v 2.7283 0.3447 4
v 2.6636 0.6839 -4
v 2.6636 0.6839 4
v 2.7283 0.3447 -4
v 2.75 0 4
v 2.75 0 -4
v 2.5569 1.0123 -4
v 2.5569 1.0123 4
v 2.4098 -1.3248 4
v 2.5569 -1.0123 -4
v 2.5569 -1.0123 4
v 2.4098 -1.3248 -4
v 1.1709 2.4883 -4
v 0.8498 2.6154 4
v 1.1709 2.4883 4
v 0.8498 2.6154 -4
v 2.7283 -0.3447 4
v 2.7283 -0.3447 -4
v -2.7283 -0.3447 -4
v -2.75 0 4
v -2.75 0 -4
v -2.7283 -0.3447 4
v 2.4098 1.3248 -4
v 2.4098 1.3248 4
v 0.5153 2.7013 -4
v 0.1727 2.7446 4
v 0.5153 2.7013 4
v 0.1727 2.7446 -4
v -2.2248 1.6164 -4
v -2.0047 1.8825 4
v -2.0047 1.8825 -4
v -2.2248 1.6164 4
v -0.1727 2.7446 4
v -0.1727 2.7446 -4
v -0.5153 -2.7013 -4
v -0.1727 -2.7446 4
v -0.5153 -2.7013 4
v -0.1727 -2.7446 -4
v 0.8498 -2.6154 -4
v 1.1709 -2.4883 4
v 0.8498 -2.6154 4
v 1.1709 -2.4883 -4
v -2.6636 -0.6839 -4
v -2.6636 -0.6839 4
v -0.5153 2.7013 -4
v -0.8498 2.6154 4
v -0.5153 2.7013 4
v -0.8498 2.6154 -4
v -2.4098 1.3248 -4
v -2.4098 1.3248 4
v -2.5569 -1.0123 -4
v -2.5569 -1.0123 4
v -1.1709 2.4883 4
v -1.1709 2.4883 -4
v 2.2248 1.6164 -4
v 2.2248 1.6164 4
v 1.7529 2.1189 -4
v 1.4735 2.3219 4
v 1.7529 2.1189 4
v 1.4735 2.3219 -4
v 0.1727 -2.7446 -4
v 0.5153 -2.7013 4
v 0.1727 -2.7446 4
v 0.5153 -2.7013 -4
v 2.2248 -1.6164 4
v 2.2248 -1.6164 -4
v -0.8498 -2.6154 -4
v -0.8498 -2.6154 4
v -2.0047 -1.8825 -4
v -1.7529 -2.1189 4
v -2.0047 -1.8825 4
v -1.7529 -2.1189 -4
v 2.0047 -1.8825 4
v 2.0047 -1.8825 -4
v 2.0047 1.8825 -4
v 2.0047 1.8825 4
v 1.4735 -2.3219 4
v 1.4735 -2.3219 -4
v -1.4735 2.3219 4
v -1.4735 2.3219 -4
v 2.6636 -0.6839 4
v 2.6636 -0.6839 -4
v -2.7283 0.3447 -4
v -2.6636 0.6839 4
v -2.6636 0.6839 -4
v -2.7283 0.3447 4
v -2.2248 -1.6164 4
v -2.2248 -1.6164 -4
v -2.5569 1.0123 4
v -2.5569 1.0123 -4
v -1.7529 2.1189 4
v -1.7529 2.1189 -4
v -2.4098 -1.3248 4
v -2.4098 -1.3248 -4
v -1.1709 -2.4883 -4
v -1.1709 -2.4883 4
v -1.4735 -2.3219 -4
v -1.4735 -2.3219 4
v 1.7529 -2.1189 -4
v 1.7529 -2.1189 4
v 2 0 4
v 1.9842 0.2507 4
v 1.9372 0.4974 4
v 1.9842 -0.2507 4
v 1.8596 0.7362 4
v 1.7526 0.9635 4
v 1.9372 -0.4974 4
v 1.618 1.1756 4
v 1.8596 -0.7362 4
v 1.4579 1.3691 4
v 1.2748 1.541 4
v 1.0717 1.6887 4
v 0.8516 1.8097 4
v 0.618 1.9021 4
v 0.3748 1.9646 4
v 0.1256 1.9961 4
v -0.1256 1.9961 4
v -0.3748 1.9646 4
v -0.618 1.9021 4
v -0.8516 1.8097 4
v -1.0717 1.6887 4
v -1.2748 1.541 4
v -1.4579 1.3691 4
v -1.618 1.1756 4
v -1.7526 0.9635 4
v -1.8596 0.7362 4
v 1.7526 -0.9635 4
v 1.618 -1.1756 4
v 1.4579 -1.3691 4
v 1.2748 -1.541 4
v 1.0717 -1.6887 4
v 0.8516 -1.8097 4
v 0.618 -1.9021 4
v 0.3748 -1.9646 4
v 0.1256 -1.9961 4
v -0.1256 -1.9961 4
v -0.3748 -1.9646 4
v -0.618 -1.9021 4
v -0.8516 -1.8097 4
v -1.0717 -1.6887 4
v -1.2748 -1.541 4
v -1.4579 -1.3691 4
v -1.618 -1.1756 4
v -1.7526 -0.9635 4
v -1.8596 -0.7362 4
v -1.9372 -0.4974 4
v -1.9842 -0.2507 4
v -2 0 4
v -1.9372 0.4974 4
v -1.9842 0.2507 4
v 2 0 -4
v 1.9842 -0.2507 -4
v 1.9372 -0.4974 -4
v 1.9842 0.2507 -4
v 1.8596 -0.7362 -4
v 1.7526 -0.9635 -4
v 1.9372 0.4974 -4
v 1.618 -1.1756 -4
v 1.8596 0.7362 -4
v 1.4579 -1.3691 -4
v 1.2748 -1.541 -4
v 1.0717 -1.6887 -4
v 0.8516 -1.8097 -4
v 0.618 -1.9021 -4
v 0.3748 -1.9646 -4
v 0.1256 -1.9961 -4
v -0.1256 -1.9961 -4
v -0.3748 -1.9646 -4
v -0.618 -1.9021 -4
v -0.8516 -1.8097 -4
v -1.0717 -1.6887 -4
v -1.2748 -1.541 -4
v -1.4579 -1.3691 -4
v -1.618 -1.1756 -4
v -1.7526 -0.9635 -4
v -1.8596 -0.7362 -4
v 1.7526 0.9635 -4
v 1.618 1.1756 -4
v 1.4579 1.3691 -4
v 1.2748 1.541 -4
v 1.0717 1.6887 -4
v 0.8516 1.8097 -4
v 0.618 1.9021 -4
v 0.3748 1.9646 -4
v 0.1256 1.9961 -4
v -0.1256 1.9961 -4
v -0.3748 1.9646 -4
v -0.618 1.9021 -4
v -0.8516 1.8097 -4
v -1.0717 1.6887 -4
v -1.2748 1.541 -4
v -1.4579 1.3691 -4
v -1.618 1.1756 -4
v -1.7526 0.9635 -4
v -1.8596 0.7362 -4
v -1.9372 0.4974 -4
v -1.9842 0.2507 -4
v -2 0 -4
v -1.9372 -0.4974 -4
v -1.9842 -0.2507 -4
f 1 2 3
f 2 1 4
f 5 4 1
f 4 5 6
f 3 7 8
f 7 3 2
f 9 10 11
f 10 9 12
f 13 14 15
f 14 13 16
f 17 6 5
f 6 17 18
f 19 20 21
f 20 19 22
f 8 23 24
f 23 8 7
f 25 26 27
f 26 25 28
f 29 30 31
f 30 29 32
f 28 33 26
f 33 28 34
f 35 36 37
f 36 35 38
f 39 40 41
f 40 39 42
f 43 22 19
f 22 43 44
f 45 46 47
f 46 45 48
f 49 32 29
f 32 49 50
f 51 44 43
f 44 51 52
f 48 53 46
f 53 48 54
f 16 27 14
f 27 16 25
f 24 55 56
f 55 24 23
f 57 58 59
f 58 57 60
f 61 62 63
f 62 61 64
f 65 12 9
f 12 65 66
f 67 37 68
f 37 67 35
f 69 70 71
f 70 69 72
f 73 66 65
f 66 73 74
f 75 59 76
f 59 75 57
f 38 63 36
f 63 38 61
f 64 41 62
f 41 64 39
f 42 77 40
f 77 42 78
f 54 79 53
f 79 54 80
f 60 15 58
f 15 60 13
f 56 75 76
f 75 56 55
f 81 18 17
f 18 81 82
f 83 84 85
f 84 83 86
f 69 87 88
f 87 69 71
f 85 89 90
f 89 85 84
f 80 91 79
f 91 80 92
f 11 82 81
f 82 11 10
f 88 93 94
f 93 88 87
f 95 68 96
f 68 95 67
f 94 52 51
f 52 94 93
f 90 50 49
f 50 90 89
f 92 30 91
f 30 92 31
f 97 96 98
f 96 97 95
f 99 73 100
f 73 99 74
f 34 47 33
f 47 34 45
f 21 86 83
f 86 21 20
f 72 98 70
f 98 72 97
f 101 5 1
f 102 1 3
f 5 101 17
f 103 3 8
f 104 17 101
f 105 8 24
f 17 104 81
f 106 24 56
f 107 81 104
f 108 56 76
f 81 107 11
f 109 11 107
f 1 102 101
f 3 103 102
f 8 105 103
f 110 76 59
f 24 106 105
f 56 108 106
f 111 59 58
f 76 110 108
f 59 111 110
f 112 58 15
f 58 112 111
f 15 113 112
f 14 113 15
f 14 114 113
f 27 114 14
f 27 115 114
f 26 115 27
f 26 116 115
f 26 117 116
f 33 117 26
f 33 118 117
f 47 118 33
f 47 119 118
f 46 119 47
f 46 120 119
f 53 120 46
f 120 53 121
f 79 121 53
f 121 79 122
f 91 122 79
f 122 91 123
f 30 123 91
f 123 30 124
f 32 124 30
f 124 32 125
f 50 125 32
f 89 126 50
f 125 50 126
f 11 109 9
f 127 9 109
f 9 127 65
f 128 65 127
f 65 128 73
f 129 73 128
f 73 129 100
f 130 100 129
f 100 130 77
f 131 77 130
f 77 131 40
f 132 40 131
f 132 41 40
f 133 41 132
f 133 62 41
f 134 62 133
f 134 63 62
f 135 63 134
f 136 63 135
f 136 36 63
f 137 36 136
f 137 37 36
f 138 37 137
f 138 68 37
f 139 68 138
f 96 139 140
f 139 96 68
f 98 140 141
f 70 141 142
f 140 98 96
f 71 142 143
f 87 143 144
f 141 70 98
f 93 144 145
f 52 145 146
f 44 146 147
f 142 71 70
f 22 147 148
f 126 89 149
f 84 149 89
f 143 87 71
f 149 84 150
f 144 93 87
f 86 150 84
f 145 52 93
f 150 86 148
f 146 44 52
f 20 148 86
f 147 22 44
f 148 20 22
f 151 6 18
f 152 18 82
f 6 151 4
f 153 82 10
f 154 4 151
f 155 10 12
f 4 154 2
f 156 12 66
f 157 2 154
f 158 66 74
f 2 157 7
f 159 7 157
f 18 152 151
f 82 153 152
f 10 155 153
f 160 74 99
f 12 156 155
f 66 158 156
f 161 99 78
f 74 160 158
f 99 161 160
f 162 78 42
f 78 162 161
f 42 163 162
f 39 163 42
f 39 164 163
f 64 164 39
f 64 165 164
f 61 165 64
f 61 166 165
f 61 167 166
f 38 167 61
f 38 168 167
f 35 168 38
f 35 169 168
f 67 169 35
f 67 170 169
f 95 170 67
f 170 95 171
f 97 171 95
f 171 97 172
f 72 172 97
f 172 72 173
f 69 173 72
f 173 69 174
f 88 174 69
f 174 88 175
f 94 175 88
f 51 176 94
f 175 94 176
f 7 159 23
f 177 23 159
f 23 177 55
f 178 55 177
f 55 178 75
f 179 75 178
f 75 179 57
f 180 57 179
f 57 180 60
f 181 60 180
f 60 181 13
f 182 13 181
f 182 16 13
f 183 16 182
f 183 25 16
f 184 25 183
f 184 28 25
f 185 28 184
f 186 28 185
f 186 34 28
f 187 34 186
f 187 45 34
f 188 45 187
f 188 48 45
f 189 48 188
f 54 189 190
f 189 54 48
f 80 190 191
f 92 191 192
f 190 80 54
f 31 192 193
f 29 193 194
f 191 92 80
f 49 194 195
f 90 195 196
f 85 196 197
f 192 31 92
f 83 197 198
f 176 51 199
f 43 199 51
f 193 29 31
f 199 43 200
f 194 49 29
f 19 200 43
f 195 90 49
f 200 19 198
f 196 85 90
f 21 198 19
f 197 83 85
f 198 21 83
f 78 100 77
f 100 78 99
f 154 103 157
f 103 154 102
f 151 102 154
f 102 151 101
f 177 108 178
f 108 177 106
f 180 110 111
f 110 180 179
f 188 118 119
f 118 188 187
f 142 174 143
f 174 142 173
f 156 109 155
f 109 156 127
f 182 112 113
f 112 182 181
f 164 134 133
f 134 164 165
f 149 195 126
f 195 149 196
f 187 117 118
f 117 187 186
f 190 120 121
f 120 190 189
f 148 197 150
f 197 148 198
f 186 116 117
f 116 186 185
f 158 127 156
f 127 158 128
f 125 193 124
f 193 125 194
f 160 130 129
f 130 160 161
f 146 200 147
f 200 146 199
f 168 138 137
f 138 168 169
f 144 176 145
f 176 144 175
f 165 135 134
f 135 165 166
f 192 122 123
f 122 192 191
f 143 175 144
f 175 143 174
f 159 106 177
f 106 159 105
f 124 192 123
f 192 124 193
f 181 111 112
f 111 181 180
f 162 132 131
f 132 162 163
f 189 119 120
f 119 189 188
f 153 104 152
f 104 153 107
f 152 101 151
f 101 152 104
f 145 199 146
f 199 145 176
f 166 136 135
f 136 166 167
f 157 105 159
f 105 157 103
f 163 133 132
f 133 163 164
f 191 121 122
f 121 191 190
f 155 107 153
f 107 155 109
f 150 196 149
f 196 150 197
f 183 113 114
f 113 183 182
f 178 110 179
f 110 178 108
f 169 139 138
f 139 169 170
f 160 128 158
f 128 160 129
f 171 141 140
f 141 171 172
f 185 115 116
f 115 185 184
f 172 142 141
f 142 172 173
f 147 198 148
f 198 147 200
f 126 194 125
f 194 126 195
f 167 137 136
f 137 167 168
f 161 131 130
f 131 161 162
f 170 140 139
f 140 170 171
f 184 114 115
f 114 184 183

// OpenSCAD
$fn = 50;


difference() {
	union() {
		translate(v = [0, 0, -4.0000000000]) {
			cylinder(h = 8, r = 2.7500000000);
		}
	}
	union() {
		translate(v = [0, 0, -100.0000000000]) {
			cylinder(h = 200, r = 2.0000000000);
		}
	}
}
